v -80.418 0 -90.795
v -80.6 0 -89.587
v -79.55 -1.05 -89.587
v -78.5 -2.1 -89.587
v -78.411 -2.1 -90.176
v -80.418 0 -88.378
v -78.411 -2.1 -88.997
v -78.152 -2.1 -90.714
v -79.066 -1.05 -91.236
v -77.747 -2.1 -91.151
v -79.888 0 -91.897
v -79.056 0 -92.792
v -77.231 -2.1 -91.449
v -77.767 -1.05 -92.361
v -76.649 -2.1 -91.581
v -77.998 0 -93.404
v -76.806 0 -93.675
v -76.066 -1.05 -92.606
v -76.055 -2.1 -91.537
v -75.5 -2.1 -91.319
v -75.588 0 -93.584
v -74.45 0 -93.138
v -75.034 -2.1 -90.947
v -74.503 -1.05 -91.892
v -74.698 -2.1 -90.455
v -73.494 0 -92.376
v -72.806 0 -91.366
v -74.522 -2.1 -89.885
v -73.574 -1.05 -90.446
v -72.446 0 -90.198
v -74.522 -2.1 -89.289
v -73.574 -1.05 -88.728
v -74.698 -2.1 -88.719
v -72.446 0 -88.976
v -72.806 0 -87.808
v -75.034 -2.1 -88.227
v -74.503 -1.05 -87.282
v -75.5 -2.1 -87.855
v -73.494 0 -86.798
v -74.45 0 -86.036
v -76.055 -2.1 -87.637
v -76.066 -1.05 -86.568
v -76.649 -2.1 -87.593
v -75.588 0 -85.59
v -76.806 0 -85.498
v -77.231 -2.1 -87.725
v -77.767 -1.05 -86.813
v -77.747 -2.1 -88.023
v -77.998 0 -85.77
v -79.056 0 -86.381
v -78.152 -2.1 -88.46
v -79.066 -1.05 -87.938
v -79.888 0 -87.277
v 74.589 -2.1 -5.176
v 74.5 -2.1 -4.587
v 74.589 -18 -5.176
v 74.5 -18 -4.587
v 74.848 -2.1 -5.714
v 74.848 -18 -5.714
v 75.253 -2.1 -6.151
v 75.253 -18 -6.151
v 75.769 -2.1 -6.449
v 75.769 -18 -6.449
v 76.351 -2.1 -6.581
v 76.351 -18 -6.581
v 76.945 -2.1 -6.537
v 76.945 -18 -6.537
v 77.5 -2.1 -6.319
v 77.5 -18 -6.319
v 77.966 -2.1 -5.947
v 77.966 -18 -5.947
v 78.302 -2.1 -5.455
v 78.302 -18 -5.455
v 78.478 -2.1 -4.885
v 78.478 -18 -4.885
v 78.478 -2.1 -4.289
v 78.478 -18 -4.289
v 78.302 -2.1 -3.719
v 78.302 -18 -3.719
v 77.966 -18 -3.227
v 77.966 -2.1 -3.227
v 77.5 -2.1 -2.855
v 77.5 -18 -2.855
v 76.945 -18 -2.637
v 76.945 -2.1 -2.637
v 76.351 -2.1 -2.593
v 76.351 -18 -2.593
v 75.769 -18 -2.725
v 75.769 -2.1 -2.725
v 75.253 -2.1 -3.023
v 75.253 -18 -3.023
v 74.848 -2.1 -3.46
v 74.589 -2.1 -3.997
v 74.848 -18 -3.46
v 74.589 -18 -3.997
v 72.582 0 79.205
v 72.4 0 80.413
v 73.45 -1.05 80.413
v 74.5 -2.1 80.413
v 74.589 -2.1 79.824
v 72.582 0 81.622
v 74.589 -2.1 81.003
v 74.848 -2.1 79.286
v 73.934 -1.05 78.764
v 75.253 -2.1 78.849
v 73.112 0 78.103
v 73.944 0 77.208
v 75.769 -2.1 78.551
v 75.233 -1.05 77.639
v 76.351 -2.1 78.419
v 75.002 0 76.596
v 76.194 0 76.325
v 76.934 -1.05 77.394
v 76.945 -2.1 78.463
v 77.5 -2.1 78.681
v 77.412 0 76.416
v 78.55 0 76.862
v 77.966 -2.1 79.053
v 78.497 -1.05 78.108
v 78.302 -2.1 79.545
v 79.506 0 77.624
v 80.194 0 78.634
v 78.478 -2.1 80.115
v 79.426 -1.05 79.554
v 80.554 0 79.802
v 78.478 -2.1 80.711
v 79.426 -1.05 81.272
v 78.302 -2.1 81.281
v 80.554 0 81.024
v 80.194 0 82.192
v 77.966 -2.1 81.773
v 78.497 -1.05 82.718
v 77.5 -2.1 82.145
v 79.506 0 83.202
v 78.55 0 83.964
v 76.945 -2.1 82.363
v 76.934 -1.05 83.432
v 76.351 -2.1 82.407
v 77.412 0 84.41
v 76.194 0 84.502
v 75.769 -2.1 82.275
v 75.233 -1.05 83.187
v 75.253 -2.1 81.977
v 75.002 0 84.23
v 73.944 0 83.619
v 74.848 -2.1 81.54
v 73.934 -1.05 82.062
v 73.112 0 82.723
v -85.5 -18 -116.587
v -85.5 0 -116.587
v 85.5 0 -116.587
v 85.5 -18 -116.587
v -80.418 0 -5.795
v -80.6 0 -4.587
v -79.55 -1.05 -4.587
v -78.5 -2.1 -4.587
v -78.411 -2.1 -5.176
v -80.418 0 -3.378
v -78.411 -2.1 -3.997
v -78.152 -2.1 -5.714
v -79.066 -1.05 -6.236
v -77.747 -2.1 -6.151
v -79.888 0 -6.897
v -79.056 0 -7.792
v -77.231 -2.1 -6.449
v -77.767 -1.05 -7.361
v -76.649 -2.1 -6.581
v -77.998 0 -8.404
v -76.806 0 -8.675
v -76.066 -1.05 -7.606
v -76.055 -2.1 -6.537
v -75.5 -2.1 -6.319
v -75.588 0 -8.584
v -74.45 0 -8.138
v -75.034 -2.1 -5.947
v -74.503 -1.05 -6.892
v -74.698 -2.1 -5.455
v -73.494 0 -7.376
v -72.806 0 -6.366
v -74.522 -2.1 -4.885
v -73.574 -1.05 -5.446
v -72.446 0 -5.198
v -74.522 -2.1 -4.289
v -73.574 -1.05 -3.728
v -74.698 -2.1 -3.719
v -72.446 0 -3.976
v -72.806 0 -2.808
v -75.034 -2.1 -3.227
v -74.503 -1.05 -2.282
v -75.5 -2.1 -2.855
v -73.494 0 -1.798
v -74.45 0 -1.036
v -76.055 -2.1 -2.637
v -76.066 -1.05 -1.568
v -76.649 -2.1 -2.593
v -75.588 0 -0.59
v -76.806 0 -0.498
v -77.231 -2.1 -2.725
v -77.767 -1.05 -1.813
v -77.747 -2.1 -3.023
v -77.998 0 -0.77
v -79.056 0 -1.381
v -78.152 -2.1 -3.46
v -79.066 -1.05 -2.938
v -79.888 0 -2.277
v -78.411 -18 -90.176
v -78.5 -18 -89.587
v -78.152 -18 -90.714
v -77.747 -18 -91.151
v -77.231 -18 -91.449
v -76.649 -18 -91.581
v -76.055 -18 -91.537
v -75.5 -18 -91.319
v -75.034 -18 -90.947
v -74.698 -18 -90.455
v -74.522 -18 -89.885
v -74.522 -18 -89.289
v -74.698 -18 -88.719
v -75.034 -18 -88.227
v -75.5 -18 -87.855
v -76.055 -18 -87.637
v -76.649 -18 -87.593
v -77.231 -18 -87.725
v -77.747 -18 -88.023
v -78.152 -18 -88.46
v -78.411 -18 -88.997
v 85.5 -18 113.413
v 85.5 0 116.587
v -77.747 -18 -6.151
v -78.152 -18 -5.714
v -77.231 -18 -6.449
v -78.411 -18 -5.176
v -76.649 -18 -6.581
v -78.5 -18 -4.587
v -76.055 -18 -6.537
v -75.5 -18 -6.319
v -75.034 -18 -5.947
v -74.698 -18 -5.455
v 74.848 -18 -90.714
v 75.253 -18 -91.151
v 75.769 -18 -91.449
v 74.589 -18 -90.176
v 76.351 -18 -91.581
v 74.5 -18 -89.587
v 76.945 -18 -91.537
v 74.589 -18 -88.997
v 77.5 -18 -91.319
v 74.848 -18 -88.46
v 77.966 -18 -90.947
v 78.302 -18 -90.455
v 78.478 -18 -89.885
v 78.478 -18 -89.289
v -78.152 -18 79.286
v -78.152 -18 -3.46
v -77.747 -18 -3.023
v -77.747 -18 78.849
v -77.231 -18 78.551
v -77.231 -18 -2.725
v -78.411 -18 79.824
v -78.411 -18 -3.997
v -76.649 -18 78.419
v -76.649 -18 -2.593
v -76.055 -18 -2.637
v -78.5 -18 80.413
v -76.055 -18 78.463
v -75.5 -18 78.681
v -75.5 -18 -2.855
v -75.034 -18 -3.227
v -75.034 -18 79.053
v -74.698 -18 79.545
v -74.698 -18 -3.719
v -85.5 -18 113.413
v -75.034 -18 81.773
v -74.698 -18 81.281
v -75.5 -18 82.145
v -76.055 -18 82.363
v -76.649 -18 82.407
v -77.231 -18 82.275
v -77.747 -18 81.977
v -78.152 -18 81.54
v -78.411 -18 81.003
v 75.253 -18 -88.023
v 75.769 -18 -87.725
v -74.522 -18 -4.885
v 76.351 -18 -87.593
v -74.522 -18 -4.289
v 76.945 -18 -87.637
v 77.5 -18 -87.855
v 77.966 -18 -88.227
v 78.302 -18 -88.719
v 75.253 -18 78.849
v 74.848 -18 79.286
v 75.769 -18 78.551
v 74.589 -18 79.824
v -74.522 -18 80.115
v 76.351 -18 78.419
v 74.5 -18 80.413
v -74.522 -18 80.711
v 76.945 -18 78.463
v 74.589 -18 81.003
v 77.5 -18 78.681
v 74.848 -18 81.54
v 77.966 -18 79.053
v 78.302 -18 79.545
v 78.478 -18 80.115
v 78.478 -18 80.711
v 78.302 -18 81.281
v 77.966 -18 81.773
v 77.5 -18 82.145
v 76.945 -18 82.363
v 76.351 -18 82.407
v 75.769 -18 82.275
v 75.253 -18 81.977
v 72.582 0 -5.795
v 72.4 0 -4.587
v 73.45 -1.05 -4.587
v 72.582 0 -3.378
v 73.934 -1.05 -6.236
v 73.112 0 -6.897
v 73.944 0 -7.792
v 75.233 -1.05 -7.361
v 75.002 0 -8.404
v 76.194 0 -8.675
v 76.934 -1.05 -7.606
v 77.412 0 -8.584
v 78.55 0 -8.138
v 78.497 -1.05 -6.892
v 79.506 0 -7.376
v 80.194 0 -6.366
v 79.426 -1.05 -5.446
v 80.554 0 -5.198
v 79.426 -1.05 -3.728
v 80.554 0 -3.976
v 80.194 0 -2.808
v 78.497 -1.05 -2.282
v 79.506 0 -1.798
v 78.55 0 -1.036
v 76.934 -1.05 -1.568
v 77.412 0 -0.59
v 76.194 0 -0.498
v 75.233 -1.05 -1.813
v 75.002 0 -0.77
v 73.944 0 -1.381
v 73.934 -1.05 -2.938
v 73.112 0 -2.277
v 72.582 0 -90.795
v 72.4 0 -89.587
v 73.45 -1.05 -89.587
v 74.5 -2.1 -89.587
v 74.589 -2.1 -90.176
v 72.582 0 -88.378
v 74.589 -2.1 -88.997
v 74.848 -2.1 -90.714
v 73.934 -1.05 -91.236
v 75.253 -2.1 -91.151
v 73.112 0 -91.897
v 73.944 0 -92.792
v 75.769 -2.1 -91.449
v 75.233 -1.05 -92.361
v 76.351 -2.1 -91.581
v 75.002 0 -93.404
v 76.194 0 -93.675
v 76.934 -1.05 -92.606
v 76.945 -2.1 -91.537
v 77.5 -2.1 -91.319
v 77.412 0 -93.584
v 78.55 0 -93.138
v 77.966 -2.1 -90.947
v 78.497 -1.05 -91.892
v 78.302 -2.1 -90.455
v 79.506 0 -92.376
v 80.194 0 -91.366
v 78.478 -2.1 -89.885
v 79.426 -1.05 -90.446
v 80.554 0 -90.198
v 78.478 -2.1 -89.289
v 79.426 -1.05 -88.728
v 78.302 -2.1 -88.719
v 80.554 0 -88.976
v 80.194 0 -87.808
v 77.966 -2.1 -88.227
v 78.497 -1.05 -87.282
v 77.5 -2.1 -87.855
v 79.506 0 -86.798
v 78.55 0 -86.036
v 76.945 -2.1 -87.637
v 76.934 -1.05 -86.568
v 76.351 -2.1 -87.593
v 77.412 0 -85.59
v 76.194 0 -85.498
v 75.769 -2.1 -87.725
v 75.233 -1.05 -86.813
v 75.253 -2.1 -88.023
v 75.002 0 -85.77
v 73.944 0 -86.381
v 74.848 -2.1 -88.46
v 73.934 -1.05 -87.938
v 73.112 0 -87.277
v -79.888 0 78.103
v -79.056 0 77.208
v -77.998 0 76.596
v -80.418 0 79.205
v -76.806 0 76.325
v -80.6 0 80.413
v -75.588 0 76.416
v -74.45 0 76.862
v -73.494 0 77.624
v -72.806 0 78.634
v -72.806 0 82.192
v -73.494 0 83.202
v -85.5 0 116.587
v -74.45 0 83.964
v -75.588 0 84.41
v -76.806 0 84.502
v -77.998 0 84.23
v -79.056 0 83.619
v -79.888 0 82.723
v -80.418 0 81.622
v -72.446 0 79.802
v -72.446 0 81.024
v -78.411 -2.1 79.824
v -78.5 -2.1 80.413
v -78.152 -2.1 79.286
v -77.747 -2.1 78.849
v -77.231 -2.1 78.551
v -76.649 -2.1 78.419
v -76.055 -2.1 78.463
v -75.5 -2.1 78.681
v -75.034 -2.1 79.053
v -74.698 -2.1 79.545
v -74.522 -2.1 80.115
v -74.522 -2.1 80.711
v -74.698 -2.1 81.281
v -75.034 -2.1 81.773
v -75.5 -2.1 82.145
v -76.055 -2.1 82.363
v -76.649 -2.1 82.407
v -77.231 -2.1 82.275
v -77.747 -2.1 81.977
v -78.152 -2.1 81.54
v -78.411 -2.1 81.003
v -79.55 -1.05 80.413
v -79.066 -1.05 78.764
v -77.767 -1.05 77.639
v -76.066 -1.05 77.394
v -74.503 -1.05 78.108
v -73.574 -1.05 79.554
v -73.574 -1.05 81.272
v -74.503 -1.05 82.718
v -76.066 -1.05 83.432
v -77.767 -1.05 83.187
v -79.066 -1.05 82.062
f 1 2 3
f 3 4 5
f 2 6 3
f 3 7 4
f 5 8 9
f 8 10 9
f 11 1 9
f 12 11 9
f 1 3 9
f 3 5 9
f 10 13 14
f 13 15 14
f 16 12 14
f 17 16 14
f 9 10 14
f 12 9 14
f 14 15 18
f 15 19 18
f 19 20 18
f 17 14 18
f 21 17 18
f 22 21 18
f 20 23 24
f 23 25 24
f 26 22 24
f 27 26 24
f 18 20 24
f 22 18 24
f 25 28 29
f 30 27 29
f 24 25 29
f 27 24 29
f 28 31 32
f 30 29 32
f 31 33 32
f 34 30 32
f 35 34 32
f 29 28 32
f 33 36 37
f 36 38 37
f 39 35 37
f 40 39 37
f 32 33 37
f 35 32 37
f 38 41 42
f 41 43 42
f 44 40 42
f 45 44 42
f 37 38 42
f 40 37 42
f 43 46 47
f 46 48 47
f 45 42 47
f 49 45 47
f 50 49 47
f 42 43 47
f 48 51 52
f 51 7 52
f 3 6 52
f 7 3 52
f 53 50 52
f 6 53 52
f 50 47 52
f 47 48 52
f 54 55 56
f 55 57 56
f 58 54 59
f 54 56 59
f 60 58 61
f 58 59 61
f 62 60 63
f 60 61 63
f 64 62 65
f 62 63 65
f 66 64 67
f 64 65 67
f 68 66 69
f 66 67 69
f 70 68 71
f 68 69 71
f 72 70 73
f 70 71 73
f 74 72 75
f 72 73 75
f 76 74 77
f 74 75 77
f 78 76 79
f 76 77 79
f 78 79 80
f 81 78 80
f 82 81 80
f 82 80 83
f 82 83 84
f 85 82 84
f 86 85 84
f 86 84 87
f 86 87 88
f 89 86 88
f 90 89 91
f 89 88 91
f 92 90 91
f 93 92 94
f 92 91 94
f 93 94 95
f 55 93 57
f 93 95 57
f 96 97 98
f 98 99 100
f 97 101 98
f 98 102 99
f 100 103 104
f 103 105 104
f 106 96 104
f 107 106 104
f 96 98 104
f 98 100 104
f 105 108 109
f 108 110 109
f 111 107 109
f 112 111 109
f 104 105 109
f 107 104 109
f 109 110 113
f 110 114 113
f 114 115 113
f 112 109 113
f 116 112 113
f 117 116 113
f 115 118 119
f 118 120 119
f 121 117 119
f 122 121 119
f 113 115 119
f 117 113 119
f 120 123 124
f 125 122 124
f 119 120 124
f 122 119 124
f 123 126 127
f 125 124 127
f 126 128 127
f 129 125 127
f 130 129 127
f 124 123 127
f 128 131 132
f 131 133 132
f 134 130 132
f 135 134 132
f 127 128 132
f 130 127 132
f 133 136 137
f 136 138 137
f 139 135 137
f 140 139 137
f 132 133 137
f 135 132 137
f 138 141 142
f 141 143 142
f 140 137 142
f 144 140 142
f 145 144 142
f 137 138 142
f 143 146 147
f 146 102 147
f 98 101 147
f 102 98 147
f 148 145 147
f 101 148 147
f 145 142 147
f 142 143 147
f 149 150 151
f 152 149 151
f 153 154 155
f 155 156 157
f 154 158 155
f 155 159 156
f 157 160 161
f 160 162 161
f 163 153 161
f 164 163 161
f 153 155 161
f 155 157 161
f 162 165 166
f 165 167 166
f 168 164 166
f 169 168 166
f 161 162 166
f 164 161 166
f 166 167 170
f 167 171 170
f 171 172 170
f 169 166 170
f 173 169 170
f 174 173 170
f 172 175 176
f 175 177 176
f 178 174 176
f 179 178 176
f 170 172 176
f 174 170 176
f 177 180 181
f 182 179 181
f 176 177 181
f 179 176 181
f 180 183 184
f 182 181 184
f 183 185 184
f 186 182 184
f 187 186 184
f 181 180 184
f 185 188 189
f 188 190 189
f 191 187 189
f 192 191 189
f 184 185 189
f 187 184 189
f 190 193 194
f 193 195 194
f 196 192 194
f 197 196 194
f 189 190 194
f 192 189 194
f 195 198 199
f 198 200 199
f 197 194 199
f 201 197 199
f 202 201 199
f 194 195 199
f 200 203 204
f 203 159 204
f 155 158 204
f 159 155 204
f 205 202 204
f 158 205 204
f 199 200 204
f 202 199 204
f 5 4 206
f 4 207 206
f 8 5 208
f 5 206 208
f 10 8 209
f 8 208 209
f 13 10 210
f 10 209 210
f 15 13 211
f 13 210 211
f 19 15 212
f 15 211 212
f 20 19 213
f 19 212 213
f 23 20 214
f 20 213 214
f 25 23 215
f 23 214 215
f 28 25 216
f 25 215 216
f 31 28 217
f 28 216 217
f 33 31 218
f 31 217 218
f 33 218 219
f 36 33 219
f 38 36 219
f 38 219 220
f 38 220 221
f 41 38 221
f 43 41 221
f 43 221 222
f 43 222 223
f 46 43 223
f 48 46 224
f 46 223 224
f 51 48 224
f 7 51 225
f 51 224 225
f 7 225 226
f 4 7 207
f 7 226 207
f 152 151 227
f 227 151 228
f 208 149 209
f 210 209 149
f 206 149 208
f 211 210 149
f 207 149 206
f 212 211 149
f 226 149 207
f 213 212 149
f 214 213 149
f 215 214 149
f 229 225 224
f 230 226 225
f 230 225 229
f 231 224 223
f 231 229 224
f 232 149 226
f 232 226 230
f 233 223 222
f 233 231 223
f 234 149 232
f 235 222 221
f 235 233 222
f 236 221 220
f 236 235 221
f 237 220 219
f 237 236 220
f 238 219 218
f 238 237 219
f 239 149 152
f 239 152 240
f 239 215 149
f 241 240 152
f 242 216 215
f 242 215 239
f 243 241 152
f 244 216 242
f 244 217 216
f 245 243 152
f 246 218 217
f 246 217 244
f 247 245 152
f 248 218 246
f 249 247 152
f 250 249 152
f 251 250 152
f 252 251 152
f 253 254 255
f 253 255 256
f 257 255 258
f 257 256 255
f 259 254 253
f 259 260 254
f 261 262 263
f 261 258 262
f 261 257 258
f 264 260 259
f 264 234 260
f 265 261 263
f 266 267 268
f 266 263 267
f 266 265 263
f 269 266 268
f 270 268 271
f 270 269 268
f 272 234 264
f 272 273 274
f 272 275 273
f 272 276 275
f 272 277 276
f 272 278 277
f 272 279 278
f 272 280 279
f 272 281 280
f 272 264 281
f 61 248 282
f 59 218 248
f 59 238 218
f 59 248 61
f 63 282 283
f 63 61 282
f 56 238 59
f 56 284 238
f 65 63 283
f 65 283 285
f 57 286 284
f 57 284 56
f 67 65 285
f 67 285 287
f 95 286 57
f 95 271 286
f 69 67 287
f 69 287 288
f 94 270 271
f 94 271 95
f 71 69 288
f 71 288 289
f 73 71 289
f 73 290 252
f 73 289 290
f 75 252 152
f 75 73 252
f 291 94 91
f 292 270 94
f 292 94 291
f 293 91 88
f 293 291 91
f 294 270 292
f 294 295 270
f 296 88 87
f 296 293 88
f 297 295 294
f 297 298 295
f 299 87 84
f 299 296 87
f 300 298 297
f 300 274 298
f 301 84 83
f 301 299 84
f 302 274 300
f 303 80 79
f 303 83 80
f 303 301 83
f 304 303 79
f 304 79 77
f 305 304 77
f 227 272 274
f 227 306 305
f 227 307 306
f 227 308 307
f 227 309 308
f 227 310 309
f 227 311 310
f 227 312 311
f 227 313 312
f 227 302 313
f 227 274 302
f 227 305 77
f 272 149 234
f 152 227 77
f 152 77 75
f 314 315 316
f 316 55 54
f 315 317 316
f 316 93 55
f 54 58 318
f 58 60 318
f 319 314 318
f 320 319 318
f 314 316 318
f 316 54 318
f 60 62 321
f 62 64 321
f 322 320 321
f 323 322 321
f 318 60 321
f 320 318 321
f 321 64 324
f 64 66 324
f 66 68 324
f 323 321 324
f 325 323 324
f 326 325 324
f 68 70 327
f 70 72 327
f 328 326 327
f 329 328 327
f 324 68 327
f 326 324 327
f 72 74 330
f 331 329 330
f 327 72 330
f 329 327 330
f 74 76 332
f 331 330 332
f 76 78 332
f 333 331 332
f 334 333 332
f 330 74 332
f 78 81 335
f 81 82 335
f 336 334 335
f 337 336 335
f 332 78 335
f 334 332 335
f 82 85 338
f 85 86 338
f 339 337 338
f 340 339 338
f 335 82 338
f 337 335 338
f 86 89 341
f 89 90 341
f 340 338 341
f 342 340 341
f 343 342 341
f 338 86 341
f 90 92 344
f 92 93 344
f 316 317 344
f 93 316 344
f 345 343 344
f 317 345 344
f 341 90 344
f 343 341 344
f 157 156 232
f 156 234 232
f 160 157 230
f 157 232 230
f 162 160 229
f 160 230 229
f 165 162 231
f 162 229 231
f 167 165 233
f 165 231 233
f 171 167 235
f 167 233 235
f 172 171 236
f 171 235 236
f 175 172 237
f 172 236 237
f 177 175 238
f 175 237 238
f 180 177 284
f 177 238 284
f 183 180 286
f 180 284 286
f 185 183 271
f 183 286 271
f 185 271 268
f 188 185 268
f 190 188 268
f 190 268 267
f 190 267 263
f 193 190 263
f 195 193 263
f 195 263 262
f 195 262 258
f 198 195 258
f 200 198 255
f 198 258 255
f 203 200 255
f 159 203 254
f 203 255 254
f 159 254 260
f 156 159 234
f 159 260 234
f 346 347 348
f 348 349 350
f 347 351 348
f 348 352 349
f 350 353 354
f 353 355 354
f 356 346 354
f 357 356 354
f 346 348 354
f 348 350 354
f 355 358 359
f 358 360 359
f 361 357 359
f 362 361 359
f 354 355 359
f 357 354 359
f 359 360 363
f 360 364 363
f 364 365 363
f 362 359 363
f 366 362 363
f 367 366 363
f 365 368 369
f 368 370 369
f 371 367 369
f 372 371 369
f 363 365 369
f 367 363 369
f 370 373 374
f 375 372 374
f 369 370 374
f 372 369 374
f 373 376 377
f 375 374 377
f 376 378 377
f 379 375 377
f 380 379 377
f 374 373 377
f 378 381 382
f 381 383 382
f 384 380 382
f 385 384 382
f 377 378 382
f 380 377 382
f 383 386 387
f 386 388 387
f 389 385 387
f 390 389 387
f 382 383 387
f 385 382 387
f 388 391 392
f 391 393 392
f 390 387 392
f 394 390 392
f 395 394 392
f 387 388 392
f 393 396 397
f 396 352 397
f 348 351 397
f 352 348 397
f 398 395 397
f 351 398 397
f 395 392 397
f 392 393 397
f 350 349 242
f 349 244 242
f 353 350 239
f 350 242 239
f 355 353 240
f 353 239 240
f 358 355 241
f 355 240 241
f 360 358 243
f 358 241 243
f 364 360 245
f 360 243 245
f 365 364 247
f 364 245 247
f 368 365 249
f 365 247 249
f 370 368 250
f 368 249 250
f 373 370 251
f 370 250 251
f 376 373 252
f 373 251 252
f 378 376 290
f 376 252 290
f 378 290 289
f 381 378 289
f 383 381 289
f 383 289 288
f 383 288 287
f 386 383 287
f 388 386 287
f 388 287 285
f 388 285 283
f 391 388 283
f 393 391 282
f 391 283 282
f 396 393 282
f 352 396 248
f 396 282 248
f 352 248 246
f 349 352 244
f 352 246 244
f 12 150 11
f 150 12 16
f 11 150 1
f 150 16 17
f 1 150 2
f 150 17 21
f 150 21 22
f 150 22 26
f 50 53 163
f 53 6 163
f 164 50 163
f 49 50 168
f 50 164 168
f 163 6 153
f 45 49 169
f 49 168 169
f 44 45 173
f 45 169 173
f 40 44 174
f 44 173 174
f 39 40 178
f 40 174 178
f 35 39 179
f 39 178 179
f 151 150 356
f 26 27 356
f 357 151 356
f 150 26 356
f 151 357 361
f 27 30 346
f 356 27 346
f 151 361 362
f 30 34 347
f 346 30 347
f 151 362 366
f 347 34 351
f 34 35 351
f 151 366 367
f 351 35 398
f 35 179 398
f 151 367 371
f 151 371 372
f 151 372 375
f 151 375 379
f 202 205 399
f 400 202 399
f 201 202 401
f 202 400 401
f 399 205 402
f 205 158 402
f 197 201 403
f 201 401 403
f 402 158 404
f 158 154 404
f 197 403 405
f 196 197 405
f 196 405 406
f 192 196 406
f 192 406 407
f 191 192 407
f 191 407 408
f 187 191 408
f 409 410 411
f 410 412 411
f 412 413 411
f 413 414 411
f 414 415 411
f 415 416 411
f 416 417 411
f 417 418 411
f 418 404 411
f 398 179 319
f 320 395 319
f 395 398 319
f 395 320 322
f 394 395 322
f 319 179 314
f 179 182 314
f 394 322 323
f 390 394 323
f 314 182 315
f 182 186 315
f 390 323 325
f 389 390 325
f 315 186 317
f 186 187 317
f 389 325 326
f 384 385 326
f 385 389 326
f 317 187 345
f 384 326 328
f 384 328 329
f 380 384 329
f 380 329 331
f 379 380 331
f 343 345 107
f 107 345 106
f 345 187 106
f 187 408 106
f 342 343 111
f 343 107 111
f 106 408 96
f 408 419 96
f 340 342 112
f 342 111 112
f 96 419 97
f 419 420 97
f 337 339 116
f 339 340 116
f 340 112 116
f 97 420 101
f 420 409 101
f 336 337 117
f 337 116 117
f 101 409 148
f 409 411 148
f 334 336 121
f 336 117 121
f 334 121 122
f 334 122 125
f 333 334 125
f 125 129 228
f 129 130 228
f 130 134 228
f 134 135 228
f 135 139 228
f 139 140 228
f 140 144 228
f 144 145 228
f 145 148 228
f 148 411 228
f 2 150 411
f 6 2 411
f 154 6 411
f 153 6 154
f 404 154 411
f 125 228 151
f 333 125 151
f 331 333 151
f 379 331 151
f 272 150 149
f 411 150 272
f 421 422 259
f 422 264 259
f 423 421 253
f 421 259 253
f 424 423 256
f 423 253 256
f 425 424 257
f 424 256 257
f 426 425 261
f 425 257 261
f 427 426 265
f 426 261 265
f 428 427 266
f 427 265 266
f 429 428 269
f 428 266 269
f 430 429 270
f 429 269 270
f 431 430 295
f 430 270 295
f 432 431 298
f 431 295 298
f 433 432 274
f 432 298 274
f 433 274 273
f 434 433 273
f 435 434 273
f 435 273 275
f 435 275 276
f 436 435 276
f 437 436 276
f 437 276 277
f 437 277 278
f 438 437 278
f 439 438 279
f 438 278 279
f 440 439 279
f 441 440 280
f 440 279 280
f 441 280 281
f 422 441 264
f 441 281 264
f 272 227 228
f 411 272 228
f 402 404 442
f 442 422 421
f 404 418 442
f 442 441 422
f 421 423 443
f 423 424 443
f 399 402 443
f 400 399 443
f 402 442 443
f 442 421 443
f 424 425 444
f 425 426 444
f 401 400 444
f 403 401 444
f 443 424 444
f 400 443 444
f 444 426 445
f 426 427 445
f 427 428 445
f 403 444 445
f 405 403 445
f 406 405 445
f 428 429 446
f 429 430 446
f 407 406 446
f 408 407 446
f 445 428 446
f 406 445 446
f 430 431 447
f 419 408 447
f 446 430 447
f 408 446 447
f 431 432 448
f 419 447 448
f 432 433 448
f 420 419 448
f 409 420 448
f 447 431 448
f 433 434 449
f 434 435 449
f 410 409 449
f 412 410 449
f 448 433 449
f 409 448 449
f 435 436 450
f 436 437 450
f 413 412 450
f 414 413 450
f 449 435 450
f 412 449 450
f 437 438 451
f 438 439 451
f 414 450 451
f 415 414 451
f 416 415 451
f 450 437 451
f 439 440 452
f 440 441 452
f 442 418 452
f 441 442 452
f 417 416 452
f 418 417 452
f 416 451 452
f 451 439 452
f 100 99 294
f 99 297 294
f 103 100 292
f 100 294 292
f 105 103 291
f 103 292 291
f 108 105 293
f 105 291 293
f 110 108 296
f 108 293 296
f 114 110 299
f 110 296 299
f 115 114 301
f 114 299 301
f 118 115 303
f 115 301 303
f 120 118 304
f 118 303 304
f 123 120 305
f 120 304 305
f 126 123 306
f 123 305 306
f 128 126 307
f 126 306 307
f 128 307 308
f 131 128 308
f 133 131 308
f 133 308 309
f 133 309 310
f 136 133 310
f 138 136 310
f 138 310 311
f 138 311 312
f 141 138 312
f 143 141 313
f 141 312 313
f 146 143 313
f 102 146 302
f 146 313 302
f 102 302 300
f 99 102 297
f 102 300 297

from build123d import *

# Parameters (mm, degrees)
F0_W           = 171
F0_H           = 233.17389
F1_DEPTH       = 18
F3_DEPTH       = 171.001
F5_D           = 4
F5_CSINK_D     = 8.2
F5_CSINK_ANGLE = 90


# Not quite as in the source:
# - a feature names something its author has since deleted; it is built from what else it names


with BuildPart() as f1:
    # F0 (on Front) → F1 (new body)
    with BuildSketch(Plane.XZ):
        Rectangle(F0_W, F0_H)
    extrude(amount=F1_DEPTH)

    # F2 (on face) → F3 (cut, through all)
    with BuildSketch(Plane.YZ.offset(85.5)):
        Polygon((-18, 113.4130593472), (0, 116.586945), (-18, 116.586945), align=None)
    extrude(amount=-F3_DEPTH, mode=Mode.SUBTRACT)

    # F5 (through all)
    with Locations(Plane(origin=(0, 0, 0), x_dir=(1, 0, 0), z_dir=(0, 1, 0))):
        with Locations((76.5, -80.413055), (-76.5, -80.413055), (76.5, 4.586945), (-76.5, 4.586945), (76.5, 89.586945), (-76.5, 89.586945)):
            CounterSinkHole(F5_D / 2, F5_CSINK_D / 2, counter_sink_angle=F5_CSINK_ANGLE)


solid = f1.part
